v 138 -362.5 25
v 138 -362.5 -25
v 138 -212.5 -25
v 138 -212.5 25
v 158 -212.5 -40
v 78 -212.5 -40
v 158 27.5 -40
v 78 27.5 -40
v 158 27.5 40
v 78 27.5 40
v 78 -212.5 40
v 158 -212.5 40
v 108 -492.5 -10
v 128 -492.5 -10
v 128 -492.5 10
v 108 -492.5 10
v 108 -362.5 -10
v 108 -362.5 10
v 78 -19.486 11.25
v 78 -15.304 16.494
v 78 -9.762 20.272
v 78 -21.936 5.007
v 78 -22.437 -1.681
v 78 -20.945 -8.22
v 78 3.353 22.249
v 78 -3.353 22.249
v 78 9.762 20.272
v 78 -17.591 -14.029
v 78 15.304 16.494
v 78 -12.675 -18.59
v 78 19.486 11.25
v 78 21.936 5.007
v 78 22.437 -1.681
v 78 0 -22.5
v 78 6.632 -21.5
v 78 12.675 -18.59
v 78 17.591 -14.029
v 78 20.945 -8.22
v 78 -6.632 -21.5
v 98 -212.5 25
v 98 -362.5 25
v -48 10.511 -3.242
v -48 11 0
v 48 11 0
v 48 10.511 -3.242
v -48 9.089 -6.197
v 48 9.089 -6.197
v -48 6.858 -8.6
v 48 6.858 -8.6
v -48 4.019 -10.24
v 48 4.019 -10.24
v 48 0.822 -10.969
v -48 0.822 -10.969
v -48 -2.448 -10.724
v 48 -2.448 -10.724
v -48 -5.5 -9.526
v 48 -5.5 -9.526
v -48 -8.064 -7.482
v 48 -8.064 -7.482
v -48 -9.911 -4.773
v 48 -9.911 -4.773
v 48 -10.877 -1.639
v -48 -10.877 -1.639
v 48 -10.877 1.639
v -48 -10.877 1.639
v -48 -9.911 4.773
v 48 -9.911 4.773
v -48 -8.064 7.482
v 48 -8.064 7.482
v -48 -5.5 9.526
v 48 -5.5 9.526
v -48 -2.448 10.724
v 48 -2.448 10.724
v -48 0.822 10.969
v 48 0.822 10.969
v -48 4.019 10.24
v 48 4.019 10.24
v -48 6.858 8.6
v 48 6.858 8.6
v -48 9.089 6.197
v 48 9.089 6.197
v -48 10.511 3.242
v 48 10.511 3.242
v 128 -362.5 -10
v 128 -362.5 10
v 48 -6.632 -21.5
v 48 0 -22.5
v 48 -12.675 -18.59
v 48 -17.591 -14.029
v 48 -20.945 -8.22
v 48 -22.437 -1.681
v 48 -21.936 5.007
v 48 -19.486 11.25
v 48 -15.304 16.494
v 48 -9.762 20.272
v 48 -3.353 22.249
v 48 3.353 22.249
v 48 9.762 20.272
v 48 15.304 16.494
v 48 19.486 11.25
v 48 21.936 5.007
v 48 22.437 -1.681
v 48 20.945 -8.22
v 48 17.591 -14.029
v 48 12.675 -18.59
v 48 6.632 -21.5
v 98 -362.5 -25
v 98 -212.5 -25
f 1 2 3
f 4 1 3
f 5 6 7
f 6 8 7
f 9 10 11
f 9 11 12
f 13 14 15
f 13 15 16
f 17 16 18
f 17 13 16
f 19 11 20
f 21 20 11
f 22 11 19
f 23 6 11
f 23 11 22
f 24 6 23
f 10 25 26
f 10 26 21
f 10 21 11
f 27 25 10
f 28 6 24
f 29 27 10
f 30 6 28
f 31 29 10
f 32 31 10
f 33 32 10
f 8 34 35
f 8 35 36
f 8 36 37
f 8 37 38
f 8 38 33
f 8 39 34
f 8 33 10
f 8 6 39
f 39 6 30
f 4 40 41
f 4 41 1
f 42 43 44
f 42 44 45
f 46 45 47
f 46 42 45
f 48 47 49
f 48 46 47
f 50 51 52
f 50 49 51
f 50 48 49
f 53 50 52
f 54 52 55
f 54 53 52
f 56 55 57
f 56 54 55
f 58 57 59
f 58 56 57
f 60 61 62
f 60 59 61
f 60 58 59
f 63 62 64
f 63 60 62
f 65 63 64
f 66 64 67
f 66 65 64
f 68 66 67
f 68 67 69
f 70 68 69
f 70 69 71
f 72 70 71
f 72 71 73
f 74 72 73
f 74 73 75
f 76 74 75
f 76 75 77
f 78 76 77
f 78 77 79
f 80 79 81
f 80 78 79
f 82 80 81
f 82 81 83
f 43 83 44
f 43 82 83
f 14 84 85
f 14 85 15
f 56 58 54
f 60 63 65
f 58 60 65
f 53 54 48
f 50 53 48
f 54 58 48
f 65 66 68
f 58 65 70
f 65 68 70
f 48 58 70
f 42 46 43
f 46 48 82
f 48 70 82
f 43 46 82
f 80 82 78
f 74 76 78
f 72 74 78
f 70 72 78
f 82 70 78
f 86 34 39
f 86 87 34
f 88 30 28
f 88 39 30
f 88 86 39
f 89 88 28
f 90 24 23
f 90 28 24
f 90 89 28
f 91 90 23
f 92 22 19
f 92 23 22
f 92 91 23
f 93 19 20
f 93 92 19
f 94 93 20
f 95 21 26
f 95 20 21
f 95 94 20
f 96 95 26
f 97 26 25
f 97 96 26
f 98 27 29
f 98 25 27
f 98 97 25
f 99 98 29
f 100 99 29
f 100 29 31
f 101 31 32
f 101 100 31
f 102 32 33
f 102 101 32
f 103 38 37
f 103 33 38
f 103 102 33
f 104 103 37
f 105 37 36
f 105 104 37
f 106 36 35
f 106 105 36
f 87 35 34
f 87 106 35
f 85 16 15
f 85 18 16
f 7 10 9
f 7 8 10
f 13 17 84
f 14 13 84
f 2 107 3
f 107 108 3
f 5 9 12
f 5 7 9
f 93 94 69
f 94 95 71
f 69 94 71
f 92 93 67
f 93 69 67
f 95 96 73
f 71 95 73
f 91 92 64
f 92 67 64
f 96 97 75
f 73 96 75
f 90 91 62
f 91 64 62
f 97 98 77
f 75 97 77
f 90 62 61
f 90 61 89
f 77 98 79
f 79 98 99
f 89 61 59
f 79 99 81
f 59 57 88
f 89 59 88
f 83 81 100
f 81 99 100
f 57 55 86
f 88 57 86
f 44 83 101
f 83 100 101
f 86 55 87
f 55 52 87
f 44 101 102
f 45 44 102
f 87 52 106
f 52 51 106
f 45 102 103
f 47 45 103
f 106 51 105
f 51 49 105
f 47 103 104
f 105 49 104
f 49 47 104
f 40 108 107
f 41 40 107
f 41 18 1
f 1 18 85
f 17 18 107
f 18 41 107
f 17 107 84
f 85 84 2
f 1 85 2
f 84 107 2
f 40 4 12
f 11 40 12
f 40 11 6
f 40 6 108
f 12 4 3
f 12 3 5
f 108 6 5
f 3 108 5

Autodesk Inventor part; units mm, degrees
ref_plane "YZ Plane" through (0, 0, 0) normal (1, 0, 0) x (0, 1, 0)
ref_plane "XZ Plane" through (0, 0, 0) normal (0, 1, 0) x (-1, 0, 0)
ref_plane "XY Plane" through (0, 0, 0) normal (0, 0, 1) x (1, 0, 0)
sketch "Sketch1" plane through (0, 0, 0) normal (0, 0, 1) x (1, 0, 0)
  line L0 (-76.6085, 0) -> (76.6085, 0) construction
  line L1 (-48, 0) -> (48, 0)
  line L2 (48, 0) -> (48, 11)
  line L3 (48, 11) -> (-48, 11)
  line L4 (-48, 11) -> (-48, 0)
  point P0 (0, 0)
  point P1 (0, 0)
  point P2 (0, 11)
  dimension "d0" = 96
  dimension "d1" = 11
revolve "Revolution1" add sketch "Sketch1" angle 360 about axis through (-76.6085, 0, 0) along (1, 0, 0)
sketch "Sketch2" plane through (48, 0, 0) normal (1, 0, 0) x (0, 0, -1)
  circle A0 centre (0, 0) radius 22.5
  dimension "d3" = 45
extrude "Extrusion1" add sketch "Sketch2" along normal blind 30
sketch "Sketch3" plane through (0, 0, 0) normal (0, 0, 1) x (1, 0, 0)
  line L0 (78, -22.5) -> (78, 22.5) projected
  line L1 (78, 27.5) -> (78, -212.5)
  line L2 (48, 22.5) -> (78, 22.5) projected
  line L3 (48, -22.5) -> (78, -22.5) projected
  line L4 (78, 27.5) -> (158, 27.5)
  line L5 (158, 27.5) -> (158, -212.5)
  line L6 (78, -212.5) -> (98, -212.5)
  line L7 (158, -212.5) -> (138, -212.5)
  line L8 (118, 27.5) -> (118, -212.5) construction
  line L9 (98, -212.5) -> (98, -362.5)
  line L10 (98, -362.5) -> (138, -362.5)
  line L11 (138, -362.5) -> (138, -212.5)
  line L12 (108, -362.5) -> (128, -362.5)
  line L13 (128, -362.5) -> (128, -492.5)
  line L14 (128, -492.5) -> (108, -492.5)
  line L15 (108, -492.5) -> (108, -362.5)
  line L16 (138, -212.5) -> (98, -212.5)
  point P0 (0, 0)
  point P1 (118, -362.5)
  dimension "d6" = 5
  dimension "d7" = 190
  dimension "d8" = 80
  dimension "d9" = 40
  dimension "d10" = 150
  dimension "d36" = 20
  dimension "d37" = 130
extrude "Extrusion2" add sketch "Sketch3" along normal mid plane 80 contours L0 L1 L4 L5 L7 L16 L6
extrude "Extrusion7" add sketch "Sketch3" along normal mid plane 50 contours L16 L11 L10 L9
extrude "Extrusion8" add sketch "Sketch3" along normal mid plane 20 contours L10 L13 L14 L15
properties part number "simp_burnisher"
